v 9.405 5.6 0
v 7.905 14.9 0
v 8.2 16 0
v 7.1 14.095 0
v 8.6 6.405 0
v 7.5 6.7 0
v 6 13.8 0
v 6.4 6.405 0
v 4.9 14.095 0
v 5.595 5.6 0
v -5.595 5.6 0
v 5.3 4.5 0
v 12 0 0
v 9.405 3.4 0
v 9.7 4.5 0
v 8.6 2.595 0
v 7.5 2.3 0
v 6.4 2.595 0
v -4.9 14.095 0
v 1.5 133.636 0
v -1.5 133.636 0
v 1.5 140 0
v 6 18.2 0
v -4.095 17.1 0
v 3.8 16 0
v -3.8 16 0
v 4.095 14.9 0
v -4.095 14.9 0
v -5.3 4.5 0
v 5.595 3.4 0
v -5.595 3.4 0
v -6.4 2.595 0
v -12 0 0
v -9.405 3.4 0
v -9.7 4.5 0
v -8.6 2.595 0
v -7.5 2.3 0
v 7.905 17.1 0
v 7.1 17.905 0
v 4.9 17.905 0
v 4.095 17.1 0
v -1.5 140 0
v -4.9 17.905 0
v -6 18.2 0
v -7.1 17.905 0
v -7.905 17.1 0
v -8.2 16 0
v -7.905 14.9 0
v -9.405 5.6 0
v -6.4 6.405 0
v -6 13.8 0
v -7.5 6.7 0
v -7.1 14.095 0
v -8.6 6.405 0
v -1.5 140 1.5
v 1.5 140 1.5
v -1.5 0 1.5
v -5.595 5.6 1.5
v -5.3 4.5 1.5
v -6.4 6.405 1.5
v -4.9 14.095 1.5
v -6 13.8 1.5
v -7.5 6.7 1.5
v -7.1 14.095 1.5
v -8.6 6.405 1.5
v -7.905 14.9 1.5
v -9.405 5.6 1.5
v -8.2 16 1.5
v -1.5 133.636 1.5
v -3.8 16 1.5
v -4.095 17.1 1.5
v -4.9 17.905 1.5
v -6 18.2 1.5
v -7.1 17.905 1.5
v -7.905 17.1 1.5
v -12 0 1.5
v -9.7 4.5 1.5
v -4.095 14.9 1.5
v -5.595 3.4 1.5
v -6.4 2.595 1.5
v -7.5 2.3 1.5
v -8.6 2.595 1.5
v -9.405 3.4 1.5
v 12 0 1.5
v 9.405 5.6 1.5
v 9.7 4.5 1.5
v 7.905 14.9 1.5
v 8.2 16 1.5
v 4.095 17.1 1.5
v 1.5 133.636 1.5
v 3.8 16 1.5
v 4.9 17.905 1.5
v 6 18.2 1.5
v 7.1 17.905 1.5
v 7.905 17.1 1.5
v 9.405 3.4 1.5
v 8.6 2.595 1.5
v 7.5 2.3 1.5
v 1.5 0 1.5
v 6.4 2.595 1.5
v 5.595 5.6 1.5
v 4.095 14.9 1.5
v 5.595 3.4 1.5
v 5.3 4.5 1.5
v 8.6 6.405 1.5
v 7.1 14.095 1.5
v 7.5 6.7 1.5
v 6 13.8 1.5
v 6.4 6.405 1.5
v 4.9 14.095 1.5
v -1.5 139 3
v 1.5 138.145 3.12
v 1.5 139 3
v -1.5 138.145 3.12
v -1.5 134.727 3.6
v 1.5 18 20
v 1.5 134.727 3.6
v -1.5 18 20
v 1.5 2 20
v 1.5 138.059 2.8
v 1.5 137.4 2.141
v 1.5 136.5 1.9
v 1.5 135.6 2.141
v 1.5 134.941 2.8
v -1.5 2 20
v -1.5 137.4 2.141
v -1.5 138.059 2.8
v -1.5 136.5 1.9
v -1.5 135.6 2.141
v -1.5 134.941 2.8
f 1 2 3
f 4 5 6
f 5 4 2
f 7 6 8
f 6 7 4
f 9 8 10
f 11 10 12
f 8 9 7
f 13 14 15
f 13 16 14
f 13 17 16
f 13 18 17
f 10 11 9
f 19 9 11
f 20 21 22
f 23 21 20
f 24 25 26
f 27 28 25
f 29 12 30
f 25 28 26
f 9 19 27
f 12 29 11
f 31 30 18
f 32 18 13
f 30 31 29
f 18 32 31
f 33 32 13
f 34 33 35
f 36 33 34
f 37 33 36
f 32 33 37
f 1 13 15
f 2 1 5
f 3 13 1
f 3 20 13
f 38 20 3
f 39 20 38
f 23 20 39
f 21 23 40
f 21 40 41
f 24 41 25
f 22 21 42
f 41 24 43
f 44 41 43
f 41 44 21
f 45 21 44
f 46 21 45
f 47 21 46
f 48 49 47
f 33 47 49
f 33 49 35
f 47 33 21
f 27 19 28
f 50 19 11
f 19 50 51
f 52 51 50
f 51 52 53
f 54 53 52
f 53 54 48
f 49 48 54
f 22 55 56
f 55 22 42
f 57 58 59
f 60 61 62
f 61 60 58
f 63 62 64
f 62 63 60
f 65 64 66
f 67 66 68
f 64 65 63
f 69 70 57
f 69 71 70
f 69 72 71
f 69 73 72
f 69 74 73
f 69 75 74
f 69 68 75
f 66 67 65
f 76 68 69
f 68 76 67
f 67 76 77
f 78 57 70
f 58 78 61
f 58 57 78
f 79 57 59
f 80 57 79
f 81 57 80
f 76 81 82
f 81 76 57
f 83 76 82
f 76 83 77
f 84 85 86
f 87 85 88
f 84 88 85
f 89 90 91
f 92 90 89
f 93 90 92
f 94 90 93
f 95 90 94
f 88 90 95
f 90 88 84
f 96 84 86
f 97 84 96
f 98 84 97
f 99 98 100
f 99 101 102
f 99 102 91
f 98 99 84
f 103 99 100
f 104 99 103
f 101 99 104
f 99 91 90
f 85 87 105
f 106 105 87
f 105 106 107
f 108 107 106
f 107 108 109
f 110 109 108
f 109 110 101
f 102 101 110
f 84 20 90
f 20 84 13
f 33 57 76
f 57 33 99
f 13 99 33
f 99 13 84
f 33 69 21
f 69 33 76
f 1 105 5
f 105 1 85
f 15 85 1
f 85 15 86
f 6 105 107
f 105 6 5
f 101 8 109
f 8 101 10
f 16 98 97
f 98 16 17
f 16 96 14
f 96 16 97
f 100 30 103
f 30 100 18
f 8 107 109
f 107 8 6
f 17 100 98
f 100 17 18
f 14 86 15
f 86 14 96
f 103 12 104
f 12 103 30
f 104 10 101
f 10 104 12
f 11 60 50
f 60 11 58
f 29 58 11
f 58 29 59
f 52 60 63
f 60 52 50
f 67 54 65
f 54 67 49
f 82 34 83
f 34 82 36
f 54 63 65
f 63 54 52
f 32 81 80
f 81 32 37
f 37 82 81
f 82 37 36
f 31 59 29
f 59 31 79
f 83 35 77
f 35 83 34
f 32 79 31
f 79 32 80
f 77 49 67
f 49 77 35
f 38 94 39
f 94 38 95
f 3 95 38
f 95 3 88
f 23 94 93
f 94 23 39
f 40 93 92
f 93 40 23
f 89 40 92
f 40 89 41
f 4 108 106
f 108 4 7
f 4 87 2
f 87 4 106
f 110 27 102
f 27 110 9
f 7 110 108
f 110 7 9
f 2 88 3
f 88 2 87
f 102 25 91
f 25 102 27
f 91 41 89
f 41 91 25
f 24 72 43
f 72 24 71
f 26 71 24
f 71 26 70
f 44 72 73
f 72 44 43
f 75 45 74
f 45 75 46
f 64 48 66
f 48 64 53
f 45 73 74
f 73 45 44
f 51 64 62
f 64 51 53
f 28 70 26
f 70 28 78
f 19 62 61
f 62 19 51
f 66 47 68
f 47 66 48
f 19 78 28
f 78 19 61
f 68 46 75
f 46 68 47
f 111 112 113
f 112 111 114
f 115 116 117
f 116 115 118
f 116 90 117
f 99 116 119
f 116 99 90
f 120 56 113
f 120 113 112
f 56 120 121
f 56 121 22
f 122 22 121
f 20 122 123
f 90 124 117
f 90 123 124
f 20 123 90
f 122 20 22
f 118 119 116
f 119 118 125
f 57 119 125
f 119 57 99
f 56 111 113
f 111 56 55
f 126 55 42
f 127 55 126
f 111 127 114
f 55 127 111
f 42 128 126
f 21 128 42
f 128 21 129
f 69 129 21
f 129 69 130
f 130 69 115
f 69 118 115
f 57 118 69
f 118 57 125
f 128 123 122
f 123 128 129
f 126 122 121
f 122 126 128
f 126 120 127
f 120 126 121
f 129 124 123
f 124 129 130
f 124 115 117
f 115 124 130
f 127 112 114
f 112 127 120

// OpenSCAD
// A console support for a doorbell

thickness = 1.5;

// The slab takes 4 (X,Y,0) points and thickness.
// Bottom layout is counter-clockwise:
//    A   D
//    B   C
module slab(a, b, c, d, th) {
  a1 = a;
  b1 = b;
  c1 = c;
  d1 = d;

  a2 = a + [0,0,th];
  b2 = b + [0,0,th];
  c2 = c + [0,0,th];
  d2 = d + [0,0,th];

  faces = [
    [0,1,2,3],
    [4,5,1,0],
    [7,6,5,4],
    [5,6,2,1],
    [6,7,3,2],
    [7,4,0,3]];

  polyhedron(
    [a1, b1, c1, d1,
     a2, b2, c2, d2],
    faces
  );
}

// Spine is like the foot but flipped sideways.
// Therefore, points are (0,Y,Z).
// The layout is looking towards negative X:
//    A   D
//   B     C
// module spine(a, b, c, d, th) {
//   a1 = a + [ th/2,0,0];
//   b1 = b + [ th/2,0,0];
//   c1 = c + [ th/2,0,0];
//   d1 = d + [ th/2,0,0];
//
//   a2 = a + [-th/2,0,0];
//   b2 = b + [-th/2,0,0];
//   c2 = c + [-th/2,0,0];
//   d2 = d + [-th/2,0,0];
//
//   faces = [
//     [0,1,2,3],
//     [4,5,1,0],
//     [7,6,5,4],
//     [5,6,2,1],
//     [6,7,3,2],
//     [7,4,0,3]];
//
//   polyhedron(
//     [a1, b1, c1, d1,
//      a2, b2, c2, d2],
//     faces
//   );
// }

// punch 4 holes in the slab for screws
difference () {
  slab([ 12.0, 0.0, 0], [ 1.0, 140.0, 0],
   [-1.0, 140.0, 0], [-12.0, 0.0, 0], thickness);

  translate([ 7.5, 4.5, -0.1])
    cylinder(2, r=2.2, $fn=12);
  translate([-7.5, 4.5, -0.1])
    cylinder(2, r=2.2, $fn=12);

  translate([ 6.0, 16.0, -0.1])
    cylinder(2, r=2.2, $fn=12);
  translate([-6.0, 16.0, -0.1])
    cylinder(2, r=2.2, $fn=12);
}

// The spine
difference () {

  // Hull is wrapped around the base and posts.
  hull () {
    // Base
    translate([-1.5, 0, 0])
      cube([3.0, 140, thickness]);
    // Tall post at the root
    translate([-1.5, 2, 0])
      cube([3.0, 16, 20]);
    // Short post at the tip
    translate([-1.5, 138, 0])
      cube([3.0, 1, 3]);
  }

  translate([0, 136.5, 3.7])
    rotate(90, [0, 1, 0])
      translate([0, 0, -3.1/2])
        cylinder(3.2, 1.8, 1.8, $fn=12);
}
